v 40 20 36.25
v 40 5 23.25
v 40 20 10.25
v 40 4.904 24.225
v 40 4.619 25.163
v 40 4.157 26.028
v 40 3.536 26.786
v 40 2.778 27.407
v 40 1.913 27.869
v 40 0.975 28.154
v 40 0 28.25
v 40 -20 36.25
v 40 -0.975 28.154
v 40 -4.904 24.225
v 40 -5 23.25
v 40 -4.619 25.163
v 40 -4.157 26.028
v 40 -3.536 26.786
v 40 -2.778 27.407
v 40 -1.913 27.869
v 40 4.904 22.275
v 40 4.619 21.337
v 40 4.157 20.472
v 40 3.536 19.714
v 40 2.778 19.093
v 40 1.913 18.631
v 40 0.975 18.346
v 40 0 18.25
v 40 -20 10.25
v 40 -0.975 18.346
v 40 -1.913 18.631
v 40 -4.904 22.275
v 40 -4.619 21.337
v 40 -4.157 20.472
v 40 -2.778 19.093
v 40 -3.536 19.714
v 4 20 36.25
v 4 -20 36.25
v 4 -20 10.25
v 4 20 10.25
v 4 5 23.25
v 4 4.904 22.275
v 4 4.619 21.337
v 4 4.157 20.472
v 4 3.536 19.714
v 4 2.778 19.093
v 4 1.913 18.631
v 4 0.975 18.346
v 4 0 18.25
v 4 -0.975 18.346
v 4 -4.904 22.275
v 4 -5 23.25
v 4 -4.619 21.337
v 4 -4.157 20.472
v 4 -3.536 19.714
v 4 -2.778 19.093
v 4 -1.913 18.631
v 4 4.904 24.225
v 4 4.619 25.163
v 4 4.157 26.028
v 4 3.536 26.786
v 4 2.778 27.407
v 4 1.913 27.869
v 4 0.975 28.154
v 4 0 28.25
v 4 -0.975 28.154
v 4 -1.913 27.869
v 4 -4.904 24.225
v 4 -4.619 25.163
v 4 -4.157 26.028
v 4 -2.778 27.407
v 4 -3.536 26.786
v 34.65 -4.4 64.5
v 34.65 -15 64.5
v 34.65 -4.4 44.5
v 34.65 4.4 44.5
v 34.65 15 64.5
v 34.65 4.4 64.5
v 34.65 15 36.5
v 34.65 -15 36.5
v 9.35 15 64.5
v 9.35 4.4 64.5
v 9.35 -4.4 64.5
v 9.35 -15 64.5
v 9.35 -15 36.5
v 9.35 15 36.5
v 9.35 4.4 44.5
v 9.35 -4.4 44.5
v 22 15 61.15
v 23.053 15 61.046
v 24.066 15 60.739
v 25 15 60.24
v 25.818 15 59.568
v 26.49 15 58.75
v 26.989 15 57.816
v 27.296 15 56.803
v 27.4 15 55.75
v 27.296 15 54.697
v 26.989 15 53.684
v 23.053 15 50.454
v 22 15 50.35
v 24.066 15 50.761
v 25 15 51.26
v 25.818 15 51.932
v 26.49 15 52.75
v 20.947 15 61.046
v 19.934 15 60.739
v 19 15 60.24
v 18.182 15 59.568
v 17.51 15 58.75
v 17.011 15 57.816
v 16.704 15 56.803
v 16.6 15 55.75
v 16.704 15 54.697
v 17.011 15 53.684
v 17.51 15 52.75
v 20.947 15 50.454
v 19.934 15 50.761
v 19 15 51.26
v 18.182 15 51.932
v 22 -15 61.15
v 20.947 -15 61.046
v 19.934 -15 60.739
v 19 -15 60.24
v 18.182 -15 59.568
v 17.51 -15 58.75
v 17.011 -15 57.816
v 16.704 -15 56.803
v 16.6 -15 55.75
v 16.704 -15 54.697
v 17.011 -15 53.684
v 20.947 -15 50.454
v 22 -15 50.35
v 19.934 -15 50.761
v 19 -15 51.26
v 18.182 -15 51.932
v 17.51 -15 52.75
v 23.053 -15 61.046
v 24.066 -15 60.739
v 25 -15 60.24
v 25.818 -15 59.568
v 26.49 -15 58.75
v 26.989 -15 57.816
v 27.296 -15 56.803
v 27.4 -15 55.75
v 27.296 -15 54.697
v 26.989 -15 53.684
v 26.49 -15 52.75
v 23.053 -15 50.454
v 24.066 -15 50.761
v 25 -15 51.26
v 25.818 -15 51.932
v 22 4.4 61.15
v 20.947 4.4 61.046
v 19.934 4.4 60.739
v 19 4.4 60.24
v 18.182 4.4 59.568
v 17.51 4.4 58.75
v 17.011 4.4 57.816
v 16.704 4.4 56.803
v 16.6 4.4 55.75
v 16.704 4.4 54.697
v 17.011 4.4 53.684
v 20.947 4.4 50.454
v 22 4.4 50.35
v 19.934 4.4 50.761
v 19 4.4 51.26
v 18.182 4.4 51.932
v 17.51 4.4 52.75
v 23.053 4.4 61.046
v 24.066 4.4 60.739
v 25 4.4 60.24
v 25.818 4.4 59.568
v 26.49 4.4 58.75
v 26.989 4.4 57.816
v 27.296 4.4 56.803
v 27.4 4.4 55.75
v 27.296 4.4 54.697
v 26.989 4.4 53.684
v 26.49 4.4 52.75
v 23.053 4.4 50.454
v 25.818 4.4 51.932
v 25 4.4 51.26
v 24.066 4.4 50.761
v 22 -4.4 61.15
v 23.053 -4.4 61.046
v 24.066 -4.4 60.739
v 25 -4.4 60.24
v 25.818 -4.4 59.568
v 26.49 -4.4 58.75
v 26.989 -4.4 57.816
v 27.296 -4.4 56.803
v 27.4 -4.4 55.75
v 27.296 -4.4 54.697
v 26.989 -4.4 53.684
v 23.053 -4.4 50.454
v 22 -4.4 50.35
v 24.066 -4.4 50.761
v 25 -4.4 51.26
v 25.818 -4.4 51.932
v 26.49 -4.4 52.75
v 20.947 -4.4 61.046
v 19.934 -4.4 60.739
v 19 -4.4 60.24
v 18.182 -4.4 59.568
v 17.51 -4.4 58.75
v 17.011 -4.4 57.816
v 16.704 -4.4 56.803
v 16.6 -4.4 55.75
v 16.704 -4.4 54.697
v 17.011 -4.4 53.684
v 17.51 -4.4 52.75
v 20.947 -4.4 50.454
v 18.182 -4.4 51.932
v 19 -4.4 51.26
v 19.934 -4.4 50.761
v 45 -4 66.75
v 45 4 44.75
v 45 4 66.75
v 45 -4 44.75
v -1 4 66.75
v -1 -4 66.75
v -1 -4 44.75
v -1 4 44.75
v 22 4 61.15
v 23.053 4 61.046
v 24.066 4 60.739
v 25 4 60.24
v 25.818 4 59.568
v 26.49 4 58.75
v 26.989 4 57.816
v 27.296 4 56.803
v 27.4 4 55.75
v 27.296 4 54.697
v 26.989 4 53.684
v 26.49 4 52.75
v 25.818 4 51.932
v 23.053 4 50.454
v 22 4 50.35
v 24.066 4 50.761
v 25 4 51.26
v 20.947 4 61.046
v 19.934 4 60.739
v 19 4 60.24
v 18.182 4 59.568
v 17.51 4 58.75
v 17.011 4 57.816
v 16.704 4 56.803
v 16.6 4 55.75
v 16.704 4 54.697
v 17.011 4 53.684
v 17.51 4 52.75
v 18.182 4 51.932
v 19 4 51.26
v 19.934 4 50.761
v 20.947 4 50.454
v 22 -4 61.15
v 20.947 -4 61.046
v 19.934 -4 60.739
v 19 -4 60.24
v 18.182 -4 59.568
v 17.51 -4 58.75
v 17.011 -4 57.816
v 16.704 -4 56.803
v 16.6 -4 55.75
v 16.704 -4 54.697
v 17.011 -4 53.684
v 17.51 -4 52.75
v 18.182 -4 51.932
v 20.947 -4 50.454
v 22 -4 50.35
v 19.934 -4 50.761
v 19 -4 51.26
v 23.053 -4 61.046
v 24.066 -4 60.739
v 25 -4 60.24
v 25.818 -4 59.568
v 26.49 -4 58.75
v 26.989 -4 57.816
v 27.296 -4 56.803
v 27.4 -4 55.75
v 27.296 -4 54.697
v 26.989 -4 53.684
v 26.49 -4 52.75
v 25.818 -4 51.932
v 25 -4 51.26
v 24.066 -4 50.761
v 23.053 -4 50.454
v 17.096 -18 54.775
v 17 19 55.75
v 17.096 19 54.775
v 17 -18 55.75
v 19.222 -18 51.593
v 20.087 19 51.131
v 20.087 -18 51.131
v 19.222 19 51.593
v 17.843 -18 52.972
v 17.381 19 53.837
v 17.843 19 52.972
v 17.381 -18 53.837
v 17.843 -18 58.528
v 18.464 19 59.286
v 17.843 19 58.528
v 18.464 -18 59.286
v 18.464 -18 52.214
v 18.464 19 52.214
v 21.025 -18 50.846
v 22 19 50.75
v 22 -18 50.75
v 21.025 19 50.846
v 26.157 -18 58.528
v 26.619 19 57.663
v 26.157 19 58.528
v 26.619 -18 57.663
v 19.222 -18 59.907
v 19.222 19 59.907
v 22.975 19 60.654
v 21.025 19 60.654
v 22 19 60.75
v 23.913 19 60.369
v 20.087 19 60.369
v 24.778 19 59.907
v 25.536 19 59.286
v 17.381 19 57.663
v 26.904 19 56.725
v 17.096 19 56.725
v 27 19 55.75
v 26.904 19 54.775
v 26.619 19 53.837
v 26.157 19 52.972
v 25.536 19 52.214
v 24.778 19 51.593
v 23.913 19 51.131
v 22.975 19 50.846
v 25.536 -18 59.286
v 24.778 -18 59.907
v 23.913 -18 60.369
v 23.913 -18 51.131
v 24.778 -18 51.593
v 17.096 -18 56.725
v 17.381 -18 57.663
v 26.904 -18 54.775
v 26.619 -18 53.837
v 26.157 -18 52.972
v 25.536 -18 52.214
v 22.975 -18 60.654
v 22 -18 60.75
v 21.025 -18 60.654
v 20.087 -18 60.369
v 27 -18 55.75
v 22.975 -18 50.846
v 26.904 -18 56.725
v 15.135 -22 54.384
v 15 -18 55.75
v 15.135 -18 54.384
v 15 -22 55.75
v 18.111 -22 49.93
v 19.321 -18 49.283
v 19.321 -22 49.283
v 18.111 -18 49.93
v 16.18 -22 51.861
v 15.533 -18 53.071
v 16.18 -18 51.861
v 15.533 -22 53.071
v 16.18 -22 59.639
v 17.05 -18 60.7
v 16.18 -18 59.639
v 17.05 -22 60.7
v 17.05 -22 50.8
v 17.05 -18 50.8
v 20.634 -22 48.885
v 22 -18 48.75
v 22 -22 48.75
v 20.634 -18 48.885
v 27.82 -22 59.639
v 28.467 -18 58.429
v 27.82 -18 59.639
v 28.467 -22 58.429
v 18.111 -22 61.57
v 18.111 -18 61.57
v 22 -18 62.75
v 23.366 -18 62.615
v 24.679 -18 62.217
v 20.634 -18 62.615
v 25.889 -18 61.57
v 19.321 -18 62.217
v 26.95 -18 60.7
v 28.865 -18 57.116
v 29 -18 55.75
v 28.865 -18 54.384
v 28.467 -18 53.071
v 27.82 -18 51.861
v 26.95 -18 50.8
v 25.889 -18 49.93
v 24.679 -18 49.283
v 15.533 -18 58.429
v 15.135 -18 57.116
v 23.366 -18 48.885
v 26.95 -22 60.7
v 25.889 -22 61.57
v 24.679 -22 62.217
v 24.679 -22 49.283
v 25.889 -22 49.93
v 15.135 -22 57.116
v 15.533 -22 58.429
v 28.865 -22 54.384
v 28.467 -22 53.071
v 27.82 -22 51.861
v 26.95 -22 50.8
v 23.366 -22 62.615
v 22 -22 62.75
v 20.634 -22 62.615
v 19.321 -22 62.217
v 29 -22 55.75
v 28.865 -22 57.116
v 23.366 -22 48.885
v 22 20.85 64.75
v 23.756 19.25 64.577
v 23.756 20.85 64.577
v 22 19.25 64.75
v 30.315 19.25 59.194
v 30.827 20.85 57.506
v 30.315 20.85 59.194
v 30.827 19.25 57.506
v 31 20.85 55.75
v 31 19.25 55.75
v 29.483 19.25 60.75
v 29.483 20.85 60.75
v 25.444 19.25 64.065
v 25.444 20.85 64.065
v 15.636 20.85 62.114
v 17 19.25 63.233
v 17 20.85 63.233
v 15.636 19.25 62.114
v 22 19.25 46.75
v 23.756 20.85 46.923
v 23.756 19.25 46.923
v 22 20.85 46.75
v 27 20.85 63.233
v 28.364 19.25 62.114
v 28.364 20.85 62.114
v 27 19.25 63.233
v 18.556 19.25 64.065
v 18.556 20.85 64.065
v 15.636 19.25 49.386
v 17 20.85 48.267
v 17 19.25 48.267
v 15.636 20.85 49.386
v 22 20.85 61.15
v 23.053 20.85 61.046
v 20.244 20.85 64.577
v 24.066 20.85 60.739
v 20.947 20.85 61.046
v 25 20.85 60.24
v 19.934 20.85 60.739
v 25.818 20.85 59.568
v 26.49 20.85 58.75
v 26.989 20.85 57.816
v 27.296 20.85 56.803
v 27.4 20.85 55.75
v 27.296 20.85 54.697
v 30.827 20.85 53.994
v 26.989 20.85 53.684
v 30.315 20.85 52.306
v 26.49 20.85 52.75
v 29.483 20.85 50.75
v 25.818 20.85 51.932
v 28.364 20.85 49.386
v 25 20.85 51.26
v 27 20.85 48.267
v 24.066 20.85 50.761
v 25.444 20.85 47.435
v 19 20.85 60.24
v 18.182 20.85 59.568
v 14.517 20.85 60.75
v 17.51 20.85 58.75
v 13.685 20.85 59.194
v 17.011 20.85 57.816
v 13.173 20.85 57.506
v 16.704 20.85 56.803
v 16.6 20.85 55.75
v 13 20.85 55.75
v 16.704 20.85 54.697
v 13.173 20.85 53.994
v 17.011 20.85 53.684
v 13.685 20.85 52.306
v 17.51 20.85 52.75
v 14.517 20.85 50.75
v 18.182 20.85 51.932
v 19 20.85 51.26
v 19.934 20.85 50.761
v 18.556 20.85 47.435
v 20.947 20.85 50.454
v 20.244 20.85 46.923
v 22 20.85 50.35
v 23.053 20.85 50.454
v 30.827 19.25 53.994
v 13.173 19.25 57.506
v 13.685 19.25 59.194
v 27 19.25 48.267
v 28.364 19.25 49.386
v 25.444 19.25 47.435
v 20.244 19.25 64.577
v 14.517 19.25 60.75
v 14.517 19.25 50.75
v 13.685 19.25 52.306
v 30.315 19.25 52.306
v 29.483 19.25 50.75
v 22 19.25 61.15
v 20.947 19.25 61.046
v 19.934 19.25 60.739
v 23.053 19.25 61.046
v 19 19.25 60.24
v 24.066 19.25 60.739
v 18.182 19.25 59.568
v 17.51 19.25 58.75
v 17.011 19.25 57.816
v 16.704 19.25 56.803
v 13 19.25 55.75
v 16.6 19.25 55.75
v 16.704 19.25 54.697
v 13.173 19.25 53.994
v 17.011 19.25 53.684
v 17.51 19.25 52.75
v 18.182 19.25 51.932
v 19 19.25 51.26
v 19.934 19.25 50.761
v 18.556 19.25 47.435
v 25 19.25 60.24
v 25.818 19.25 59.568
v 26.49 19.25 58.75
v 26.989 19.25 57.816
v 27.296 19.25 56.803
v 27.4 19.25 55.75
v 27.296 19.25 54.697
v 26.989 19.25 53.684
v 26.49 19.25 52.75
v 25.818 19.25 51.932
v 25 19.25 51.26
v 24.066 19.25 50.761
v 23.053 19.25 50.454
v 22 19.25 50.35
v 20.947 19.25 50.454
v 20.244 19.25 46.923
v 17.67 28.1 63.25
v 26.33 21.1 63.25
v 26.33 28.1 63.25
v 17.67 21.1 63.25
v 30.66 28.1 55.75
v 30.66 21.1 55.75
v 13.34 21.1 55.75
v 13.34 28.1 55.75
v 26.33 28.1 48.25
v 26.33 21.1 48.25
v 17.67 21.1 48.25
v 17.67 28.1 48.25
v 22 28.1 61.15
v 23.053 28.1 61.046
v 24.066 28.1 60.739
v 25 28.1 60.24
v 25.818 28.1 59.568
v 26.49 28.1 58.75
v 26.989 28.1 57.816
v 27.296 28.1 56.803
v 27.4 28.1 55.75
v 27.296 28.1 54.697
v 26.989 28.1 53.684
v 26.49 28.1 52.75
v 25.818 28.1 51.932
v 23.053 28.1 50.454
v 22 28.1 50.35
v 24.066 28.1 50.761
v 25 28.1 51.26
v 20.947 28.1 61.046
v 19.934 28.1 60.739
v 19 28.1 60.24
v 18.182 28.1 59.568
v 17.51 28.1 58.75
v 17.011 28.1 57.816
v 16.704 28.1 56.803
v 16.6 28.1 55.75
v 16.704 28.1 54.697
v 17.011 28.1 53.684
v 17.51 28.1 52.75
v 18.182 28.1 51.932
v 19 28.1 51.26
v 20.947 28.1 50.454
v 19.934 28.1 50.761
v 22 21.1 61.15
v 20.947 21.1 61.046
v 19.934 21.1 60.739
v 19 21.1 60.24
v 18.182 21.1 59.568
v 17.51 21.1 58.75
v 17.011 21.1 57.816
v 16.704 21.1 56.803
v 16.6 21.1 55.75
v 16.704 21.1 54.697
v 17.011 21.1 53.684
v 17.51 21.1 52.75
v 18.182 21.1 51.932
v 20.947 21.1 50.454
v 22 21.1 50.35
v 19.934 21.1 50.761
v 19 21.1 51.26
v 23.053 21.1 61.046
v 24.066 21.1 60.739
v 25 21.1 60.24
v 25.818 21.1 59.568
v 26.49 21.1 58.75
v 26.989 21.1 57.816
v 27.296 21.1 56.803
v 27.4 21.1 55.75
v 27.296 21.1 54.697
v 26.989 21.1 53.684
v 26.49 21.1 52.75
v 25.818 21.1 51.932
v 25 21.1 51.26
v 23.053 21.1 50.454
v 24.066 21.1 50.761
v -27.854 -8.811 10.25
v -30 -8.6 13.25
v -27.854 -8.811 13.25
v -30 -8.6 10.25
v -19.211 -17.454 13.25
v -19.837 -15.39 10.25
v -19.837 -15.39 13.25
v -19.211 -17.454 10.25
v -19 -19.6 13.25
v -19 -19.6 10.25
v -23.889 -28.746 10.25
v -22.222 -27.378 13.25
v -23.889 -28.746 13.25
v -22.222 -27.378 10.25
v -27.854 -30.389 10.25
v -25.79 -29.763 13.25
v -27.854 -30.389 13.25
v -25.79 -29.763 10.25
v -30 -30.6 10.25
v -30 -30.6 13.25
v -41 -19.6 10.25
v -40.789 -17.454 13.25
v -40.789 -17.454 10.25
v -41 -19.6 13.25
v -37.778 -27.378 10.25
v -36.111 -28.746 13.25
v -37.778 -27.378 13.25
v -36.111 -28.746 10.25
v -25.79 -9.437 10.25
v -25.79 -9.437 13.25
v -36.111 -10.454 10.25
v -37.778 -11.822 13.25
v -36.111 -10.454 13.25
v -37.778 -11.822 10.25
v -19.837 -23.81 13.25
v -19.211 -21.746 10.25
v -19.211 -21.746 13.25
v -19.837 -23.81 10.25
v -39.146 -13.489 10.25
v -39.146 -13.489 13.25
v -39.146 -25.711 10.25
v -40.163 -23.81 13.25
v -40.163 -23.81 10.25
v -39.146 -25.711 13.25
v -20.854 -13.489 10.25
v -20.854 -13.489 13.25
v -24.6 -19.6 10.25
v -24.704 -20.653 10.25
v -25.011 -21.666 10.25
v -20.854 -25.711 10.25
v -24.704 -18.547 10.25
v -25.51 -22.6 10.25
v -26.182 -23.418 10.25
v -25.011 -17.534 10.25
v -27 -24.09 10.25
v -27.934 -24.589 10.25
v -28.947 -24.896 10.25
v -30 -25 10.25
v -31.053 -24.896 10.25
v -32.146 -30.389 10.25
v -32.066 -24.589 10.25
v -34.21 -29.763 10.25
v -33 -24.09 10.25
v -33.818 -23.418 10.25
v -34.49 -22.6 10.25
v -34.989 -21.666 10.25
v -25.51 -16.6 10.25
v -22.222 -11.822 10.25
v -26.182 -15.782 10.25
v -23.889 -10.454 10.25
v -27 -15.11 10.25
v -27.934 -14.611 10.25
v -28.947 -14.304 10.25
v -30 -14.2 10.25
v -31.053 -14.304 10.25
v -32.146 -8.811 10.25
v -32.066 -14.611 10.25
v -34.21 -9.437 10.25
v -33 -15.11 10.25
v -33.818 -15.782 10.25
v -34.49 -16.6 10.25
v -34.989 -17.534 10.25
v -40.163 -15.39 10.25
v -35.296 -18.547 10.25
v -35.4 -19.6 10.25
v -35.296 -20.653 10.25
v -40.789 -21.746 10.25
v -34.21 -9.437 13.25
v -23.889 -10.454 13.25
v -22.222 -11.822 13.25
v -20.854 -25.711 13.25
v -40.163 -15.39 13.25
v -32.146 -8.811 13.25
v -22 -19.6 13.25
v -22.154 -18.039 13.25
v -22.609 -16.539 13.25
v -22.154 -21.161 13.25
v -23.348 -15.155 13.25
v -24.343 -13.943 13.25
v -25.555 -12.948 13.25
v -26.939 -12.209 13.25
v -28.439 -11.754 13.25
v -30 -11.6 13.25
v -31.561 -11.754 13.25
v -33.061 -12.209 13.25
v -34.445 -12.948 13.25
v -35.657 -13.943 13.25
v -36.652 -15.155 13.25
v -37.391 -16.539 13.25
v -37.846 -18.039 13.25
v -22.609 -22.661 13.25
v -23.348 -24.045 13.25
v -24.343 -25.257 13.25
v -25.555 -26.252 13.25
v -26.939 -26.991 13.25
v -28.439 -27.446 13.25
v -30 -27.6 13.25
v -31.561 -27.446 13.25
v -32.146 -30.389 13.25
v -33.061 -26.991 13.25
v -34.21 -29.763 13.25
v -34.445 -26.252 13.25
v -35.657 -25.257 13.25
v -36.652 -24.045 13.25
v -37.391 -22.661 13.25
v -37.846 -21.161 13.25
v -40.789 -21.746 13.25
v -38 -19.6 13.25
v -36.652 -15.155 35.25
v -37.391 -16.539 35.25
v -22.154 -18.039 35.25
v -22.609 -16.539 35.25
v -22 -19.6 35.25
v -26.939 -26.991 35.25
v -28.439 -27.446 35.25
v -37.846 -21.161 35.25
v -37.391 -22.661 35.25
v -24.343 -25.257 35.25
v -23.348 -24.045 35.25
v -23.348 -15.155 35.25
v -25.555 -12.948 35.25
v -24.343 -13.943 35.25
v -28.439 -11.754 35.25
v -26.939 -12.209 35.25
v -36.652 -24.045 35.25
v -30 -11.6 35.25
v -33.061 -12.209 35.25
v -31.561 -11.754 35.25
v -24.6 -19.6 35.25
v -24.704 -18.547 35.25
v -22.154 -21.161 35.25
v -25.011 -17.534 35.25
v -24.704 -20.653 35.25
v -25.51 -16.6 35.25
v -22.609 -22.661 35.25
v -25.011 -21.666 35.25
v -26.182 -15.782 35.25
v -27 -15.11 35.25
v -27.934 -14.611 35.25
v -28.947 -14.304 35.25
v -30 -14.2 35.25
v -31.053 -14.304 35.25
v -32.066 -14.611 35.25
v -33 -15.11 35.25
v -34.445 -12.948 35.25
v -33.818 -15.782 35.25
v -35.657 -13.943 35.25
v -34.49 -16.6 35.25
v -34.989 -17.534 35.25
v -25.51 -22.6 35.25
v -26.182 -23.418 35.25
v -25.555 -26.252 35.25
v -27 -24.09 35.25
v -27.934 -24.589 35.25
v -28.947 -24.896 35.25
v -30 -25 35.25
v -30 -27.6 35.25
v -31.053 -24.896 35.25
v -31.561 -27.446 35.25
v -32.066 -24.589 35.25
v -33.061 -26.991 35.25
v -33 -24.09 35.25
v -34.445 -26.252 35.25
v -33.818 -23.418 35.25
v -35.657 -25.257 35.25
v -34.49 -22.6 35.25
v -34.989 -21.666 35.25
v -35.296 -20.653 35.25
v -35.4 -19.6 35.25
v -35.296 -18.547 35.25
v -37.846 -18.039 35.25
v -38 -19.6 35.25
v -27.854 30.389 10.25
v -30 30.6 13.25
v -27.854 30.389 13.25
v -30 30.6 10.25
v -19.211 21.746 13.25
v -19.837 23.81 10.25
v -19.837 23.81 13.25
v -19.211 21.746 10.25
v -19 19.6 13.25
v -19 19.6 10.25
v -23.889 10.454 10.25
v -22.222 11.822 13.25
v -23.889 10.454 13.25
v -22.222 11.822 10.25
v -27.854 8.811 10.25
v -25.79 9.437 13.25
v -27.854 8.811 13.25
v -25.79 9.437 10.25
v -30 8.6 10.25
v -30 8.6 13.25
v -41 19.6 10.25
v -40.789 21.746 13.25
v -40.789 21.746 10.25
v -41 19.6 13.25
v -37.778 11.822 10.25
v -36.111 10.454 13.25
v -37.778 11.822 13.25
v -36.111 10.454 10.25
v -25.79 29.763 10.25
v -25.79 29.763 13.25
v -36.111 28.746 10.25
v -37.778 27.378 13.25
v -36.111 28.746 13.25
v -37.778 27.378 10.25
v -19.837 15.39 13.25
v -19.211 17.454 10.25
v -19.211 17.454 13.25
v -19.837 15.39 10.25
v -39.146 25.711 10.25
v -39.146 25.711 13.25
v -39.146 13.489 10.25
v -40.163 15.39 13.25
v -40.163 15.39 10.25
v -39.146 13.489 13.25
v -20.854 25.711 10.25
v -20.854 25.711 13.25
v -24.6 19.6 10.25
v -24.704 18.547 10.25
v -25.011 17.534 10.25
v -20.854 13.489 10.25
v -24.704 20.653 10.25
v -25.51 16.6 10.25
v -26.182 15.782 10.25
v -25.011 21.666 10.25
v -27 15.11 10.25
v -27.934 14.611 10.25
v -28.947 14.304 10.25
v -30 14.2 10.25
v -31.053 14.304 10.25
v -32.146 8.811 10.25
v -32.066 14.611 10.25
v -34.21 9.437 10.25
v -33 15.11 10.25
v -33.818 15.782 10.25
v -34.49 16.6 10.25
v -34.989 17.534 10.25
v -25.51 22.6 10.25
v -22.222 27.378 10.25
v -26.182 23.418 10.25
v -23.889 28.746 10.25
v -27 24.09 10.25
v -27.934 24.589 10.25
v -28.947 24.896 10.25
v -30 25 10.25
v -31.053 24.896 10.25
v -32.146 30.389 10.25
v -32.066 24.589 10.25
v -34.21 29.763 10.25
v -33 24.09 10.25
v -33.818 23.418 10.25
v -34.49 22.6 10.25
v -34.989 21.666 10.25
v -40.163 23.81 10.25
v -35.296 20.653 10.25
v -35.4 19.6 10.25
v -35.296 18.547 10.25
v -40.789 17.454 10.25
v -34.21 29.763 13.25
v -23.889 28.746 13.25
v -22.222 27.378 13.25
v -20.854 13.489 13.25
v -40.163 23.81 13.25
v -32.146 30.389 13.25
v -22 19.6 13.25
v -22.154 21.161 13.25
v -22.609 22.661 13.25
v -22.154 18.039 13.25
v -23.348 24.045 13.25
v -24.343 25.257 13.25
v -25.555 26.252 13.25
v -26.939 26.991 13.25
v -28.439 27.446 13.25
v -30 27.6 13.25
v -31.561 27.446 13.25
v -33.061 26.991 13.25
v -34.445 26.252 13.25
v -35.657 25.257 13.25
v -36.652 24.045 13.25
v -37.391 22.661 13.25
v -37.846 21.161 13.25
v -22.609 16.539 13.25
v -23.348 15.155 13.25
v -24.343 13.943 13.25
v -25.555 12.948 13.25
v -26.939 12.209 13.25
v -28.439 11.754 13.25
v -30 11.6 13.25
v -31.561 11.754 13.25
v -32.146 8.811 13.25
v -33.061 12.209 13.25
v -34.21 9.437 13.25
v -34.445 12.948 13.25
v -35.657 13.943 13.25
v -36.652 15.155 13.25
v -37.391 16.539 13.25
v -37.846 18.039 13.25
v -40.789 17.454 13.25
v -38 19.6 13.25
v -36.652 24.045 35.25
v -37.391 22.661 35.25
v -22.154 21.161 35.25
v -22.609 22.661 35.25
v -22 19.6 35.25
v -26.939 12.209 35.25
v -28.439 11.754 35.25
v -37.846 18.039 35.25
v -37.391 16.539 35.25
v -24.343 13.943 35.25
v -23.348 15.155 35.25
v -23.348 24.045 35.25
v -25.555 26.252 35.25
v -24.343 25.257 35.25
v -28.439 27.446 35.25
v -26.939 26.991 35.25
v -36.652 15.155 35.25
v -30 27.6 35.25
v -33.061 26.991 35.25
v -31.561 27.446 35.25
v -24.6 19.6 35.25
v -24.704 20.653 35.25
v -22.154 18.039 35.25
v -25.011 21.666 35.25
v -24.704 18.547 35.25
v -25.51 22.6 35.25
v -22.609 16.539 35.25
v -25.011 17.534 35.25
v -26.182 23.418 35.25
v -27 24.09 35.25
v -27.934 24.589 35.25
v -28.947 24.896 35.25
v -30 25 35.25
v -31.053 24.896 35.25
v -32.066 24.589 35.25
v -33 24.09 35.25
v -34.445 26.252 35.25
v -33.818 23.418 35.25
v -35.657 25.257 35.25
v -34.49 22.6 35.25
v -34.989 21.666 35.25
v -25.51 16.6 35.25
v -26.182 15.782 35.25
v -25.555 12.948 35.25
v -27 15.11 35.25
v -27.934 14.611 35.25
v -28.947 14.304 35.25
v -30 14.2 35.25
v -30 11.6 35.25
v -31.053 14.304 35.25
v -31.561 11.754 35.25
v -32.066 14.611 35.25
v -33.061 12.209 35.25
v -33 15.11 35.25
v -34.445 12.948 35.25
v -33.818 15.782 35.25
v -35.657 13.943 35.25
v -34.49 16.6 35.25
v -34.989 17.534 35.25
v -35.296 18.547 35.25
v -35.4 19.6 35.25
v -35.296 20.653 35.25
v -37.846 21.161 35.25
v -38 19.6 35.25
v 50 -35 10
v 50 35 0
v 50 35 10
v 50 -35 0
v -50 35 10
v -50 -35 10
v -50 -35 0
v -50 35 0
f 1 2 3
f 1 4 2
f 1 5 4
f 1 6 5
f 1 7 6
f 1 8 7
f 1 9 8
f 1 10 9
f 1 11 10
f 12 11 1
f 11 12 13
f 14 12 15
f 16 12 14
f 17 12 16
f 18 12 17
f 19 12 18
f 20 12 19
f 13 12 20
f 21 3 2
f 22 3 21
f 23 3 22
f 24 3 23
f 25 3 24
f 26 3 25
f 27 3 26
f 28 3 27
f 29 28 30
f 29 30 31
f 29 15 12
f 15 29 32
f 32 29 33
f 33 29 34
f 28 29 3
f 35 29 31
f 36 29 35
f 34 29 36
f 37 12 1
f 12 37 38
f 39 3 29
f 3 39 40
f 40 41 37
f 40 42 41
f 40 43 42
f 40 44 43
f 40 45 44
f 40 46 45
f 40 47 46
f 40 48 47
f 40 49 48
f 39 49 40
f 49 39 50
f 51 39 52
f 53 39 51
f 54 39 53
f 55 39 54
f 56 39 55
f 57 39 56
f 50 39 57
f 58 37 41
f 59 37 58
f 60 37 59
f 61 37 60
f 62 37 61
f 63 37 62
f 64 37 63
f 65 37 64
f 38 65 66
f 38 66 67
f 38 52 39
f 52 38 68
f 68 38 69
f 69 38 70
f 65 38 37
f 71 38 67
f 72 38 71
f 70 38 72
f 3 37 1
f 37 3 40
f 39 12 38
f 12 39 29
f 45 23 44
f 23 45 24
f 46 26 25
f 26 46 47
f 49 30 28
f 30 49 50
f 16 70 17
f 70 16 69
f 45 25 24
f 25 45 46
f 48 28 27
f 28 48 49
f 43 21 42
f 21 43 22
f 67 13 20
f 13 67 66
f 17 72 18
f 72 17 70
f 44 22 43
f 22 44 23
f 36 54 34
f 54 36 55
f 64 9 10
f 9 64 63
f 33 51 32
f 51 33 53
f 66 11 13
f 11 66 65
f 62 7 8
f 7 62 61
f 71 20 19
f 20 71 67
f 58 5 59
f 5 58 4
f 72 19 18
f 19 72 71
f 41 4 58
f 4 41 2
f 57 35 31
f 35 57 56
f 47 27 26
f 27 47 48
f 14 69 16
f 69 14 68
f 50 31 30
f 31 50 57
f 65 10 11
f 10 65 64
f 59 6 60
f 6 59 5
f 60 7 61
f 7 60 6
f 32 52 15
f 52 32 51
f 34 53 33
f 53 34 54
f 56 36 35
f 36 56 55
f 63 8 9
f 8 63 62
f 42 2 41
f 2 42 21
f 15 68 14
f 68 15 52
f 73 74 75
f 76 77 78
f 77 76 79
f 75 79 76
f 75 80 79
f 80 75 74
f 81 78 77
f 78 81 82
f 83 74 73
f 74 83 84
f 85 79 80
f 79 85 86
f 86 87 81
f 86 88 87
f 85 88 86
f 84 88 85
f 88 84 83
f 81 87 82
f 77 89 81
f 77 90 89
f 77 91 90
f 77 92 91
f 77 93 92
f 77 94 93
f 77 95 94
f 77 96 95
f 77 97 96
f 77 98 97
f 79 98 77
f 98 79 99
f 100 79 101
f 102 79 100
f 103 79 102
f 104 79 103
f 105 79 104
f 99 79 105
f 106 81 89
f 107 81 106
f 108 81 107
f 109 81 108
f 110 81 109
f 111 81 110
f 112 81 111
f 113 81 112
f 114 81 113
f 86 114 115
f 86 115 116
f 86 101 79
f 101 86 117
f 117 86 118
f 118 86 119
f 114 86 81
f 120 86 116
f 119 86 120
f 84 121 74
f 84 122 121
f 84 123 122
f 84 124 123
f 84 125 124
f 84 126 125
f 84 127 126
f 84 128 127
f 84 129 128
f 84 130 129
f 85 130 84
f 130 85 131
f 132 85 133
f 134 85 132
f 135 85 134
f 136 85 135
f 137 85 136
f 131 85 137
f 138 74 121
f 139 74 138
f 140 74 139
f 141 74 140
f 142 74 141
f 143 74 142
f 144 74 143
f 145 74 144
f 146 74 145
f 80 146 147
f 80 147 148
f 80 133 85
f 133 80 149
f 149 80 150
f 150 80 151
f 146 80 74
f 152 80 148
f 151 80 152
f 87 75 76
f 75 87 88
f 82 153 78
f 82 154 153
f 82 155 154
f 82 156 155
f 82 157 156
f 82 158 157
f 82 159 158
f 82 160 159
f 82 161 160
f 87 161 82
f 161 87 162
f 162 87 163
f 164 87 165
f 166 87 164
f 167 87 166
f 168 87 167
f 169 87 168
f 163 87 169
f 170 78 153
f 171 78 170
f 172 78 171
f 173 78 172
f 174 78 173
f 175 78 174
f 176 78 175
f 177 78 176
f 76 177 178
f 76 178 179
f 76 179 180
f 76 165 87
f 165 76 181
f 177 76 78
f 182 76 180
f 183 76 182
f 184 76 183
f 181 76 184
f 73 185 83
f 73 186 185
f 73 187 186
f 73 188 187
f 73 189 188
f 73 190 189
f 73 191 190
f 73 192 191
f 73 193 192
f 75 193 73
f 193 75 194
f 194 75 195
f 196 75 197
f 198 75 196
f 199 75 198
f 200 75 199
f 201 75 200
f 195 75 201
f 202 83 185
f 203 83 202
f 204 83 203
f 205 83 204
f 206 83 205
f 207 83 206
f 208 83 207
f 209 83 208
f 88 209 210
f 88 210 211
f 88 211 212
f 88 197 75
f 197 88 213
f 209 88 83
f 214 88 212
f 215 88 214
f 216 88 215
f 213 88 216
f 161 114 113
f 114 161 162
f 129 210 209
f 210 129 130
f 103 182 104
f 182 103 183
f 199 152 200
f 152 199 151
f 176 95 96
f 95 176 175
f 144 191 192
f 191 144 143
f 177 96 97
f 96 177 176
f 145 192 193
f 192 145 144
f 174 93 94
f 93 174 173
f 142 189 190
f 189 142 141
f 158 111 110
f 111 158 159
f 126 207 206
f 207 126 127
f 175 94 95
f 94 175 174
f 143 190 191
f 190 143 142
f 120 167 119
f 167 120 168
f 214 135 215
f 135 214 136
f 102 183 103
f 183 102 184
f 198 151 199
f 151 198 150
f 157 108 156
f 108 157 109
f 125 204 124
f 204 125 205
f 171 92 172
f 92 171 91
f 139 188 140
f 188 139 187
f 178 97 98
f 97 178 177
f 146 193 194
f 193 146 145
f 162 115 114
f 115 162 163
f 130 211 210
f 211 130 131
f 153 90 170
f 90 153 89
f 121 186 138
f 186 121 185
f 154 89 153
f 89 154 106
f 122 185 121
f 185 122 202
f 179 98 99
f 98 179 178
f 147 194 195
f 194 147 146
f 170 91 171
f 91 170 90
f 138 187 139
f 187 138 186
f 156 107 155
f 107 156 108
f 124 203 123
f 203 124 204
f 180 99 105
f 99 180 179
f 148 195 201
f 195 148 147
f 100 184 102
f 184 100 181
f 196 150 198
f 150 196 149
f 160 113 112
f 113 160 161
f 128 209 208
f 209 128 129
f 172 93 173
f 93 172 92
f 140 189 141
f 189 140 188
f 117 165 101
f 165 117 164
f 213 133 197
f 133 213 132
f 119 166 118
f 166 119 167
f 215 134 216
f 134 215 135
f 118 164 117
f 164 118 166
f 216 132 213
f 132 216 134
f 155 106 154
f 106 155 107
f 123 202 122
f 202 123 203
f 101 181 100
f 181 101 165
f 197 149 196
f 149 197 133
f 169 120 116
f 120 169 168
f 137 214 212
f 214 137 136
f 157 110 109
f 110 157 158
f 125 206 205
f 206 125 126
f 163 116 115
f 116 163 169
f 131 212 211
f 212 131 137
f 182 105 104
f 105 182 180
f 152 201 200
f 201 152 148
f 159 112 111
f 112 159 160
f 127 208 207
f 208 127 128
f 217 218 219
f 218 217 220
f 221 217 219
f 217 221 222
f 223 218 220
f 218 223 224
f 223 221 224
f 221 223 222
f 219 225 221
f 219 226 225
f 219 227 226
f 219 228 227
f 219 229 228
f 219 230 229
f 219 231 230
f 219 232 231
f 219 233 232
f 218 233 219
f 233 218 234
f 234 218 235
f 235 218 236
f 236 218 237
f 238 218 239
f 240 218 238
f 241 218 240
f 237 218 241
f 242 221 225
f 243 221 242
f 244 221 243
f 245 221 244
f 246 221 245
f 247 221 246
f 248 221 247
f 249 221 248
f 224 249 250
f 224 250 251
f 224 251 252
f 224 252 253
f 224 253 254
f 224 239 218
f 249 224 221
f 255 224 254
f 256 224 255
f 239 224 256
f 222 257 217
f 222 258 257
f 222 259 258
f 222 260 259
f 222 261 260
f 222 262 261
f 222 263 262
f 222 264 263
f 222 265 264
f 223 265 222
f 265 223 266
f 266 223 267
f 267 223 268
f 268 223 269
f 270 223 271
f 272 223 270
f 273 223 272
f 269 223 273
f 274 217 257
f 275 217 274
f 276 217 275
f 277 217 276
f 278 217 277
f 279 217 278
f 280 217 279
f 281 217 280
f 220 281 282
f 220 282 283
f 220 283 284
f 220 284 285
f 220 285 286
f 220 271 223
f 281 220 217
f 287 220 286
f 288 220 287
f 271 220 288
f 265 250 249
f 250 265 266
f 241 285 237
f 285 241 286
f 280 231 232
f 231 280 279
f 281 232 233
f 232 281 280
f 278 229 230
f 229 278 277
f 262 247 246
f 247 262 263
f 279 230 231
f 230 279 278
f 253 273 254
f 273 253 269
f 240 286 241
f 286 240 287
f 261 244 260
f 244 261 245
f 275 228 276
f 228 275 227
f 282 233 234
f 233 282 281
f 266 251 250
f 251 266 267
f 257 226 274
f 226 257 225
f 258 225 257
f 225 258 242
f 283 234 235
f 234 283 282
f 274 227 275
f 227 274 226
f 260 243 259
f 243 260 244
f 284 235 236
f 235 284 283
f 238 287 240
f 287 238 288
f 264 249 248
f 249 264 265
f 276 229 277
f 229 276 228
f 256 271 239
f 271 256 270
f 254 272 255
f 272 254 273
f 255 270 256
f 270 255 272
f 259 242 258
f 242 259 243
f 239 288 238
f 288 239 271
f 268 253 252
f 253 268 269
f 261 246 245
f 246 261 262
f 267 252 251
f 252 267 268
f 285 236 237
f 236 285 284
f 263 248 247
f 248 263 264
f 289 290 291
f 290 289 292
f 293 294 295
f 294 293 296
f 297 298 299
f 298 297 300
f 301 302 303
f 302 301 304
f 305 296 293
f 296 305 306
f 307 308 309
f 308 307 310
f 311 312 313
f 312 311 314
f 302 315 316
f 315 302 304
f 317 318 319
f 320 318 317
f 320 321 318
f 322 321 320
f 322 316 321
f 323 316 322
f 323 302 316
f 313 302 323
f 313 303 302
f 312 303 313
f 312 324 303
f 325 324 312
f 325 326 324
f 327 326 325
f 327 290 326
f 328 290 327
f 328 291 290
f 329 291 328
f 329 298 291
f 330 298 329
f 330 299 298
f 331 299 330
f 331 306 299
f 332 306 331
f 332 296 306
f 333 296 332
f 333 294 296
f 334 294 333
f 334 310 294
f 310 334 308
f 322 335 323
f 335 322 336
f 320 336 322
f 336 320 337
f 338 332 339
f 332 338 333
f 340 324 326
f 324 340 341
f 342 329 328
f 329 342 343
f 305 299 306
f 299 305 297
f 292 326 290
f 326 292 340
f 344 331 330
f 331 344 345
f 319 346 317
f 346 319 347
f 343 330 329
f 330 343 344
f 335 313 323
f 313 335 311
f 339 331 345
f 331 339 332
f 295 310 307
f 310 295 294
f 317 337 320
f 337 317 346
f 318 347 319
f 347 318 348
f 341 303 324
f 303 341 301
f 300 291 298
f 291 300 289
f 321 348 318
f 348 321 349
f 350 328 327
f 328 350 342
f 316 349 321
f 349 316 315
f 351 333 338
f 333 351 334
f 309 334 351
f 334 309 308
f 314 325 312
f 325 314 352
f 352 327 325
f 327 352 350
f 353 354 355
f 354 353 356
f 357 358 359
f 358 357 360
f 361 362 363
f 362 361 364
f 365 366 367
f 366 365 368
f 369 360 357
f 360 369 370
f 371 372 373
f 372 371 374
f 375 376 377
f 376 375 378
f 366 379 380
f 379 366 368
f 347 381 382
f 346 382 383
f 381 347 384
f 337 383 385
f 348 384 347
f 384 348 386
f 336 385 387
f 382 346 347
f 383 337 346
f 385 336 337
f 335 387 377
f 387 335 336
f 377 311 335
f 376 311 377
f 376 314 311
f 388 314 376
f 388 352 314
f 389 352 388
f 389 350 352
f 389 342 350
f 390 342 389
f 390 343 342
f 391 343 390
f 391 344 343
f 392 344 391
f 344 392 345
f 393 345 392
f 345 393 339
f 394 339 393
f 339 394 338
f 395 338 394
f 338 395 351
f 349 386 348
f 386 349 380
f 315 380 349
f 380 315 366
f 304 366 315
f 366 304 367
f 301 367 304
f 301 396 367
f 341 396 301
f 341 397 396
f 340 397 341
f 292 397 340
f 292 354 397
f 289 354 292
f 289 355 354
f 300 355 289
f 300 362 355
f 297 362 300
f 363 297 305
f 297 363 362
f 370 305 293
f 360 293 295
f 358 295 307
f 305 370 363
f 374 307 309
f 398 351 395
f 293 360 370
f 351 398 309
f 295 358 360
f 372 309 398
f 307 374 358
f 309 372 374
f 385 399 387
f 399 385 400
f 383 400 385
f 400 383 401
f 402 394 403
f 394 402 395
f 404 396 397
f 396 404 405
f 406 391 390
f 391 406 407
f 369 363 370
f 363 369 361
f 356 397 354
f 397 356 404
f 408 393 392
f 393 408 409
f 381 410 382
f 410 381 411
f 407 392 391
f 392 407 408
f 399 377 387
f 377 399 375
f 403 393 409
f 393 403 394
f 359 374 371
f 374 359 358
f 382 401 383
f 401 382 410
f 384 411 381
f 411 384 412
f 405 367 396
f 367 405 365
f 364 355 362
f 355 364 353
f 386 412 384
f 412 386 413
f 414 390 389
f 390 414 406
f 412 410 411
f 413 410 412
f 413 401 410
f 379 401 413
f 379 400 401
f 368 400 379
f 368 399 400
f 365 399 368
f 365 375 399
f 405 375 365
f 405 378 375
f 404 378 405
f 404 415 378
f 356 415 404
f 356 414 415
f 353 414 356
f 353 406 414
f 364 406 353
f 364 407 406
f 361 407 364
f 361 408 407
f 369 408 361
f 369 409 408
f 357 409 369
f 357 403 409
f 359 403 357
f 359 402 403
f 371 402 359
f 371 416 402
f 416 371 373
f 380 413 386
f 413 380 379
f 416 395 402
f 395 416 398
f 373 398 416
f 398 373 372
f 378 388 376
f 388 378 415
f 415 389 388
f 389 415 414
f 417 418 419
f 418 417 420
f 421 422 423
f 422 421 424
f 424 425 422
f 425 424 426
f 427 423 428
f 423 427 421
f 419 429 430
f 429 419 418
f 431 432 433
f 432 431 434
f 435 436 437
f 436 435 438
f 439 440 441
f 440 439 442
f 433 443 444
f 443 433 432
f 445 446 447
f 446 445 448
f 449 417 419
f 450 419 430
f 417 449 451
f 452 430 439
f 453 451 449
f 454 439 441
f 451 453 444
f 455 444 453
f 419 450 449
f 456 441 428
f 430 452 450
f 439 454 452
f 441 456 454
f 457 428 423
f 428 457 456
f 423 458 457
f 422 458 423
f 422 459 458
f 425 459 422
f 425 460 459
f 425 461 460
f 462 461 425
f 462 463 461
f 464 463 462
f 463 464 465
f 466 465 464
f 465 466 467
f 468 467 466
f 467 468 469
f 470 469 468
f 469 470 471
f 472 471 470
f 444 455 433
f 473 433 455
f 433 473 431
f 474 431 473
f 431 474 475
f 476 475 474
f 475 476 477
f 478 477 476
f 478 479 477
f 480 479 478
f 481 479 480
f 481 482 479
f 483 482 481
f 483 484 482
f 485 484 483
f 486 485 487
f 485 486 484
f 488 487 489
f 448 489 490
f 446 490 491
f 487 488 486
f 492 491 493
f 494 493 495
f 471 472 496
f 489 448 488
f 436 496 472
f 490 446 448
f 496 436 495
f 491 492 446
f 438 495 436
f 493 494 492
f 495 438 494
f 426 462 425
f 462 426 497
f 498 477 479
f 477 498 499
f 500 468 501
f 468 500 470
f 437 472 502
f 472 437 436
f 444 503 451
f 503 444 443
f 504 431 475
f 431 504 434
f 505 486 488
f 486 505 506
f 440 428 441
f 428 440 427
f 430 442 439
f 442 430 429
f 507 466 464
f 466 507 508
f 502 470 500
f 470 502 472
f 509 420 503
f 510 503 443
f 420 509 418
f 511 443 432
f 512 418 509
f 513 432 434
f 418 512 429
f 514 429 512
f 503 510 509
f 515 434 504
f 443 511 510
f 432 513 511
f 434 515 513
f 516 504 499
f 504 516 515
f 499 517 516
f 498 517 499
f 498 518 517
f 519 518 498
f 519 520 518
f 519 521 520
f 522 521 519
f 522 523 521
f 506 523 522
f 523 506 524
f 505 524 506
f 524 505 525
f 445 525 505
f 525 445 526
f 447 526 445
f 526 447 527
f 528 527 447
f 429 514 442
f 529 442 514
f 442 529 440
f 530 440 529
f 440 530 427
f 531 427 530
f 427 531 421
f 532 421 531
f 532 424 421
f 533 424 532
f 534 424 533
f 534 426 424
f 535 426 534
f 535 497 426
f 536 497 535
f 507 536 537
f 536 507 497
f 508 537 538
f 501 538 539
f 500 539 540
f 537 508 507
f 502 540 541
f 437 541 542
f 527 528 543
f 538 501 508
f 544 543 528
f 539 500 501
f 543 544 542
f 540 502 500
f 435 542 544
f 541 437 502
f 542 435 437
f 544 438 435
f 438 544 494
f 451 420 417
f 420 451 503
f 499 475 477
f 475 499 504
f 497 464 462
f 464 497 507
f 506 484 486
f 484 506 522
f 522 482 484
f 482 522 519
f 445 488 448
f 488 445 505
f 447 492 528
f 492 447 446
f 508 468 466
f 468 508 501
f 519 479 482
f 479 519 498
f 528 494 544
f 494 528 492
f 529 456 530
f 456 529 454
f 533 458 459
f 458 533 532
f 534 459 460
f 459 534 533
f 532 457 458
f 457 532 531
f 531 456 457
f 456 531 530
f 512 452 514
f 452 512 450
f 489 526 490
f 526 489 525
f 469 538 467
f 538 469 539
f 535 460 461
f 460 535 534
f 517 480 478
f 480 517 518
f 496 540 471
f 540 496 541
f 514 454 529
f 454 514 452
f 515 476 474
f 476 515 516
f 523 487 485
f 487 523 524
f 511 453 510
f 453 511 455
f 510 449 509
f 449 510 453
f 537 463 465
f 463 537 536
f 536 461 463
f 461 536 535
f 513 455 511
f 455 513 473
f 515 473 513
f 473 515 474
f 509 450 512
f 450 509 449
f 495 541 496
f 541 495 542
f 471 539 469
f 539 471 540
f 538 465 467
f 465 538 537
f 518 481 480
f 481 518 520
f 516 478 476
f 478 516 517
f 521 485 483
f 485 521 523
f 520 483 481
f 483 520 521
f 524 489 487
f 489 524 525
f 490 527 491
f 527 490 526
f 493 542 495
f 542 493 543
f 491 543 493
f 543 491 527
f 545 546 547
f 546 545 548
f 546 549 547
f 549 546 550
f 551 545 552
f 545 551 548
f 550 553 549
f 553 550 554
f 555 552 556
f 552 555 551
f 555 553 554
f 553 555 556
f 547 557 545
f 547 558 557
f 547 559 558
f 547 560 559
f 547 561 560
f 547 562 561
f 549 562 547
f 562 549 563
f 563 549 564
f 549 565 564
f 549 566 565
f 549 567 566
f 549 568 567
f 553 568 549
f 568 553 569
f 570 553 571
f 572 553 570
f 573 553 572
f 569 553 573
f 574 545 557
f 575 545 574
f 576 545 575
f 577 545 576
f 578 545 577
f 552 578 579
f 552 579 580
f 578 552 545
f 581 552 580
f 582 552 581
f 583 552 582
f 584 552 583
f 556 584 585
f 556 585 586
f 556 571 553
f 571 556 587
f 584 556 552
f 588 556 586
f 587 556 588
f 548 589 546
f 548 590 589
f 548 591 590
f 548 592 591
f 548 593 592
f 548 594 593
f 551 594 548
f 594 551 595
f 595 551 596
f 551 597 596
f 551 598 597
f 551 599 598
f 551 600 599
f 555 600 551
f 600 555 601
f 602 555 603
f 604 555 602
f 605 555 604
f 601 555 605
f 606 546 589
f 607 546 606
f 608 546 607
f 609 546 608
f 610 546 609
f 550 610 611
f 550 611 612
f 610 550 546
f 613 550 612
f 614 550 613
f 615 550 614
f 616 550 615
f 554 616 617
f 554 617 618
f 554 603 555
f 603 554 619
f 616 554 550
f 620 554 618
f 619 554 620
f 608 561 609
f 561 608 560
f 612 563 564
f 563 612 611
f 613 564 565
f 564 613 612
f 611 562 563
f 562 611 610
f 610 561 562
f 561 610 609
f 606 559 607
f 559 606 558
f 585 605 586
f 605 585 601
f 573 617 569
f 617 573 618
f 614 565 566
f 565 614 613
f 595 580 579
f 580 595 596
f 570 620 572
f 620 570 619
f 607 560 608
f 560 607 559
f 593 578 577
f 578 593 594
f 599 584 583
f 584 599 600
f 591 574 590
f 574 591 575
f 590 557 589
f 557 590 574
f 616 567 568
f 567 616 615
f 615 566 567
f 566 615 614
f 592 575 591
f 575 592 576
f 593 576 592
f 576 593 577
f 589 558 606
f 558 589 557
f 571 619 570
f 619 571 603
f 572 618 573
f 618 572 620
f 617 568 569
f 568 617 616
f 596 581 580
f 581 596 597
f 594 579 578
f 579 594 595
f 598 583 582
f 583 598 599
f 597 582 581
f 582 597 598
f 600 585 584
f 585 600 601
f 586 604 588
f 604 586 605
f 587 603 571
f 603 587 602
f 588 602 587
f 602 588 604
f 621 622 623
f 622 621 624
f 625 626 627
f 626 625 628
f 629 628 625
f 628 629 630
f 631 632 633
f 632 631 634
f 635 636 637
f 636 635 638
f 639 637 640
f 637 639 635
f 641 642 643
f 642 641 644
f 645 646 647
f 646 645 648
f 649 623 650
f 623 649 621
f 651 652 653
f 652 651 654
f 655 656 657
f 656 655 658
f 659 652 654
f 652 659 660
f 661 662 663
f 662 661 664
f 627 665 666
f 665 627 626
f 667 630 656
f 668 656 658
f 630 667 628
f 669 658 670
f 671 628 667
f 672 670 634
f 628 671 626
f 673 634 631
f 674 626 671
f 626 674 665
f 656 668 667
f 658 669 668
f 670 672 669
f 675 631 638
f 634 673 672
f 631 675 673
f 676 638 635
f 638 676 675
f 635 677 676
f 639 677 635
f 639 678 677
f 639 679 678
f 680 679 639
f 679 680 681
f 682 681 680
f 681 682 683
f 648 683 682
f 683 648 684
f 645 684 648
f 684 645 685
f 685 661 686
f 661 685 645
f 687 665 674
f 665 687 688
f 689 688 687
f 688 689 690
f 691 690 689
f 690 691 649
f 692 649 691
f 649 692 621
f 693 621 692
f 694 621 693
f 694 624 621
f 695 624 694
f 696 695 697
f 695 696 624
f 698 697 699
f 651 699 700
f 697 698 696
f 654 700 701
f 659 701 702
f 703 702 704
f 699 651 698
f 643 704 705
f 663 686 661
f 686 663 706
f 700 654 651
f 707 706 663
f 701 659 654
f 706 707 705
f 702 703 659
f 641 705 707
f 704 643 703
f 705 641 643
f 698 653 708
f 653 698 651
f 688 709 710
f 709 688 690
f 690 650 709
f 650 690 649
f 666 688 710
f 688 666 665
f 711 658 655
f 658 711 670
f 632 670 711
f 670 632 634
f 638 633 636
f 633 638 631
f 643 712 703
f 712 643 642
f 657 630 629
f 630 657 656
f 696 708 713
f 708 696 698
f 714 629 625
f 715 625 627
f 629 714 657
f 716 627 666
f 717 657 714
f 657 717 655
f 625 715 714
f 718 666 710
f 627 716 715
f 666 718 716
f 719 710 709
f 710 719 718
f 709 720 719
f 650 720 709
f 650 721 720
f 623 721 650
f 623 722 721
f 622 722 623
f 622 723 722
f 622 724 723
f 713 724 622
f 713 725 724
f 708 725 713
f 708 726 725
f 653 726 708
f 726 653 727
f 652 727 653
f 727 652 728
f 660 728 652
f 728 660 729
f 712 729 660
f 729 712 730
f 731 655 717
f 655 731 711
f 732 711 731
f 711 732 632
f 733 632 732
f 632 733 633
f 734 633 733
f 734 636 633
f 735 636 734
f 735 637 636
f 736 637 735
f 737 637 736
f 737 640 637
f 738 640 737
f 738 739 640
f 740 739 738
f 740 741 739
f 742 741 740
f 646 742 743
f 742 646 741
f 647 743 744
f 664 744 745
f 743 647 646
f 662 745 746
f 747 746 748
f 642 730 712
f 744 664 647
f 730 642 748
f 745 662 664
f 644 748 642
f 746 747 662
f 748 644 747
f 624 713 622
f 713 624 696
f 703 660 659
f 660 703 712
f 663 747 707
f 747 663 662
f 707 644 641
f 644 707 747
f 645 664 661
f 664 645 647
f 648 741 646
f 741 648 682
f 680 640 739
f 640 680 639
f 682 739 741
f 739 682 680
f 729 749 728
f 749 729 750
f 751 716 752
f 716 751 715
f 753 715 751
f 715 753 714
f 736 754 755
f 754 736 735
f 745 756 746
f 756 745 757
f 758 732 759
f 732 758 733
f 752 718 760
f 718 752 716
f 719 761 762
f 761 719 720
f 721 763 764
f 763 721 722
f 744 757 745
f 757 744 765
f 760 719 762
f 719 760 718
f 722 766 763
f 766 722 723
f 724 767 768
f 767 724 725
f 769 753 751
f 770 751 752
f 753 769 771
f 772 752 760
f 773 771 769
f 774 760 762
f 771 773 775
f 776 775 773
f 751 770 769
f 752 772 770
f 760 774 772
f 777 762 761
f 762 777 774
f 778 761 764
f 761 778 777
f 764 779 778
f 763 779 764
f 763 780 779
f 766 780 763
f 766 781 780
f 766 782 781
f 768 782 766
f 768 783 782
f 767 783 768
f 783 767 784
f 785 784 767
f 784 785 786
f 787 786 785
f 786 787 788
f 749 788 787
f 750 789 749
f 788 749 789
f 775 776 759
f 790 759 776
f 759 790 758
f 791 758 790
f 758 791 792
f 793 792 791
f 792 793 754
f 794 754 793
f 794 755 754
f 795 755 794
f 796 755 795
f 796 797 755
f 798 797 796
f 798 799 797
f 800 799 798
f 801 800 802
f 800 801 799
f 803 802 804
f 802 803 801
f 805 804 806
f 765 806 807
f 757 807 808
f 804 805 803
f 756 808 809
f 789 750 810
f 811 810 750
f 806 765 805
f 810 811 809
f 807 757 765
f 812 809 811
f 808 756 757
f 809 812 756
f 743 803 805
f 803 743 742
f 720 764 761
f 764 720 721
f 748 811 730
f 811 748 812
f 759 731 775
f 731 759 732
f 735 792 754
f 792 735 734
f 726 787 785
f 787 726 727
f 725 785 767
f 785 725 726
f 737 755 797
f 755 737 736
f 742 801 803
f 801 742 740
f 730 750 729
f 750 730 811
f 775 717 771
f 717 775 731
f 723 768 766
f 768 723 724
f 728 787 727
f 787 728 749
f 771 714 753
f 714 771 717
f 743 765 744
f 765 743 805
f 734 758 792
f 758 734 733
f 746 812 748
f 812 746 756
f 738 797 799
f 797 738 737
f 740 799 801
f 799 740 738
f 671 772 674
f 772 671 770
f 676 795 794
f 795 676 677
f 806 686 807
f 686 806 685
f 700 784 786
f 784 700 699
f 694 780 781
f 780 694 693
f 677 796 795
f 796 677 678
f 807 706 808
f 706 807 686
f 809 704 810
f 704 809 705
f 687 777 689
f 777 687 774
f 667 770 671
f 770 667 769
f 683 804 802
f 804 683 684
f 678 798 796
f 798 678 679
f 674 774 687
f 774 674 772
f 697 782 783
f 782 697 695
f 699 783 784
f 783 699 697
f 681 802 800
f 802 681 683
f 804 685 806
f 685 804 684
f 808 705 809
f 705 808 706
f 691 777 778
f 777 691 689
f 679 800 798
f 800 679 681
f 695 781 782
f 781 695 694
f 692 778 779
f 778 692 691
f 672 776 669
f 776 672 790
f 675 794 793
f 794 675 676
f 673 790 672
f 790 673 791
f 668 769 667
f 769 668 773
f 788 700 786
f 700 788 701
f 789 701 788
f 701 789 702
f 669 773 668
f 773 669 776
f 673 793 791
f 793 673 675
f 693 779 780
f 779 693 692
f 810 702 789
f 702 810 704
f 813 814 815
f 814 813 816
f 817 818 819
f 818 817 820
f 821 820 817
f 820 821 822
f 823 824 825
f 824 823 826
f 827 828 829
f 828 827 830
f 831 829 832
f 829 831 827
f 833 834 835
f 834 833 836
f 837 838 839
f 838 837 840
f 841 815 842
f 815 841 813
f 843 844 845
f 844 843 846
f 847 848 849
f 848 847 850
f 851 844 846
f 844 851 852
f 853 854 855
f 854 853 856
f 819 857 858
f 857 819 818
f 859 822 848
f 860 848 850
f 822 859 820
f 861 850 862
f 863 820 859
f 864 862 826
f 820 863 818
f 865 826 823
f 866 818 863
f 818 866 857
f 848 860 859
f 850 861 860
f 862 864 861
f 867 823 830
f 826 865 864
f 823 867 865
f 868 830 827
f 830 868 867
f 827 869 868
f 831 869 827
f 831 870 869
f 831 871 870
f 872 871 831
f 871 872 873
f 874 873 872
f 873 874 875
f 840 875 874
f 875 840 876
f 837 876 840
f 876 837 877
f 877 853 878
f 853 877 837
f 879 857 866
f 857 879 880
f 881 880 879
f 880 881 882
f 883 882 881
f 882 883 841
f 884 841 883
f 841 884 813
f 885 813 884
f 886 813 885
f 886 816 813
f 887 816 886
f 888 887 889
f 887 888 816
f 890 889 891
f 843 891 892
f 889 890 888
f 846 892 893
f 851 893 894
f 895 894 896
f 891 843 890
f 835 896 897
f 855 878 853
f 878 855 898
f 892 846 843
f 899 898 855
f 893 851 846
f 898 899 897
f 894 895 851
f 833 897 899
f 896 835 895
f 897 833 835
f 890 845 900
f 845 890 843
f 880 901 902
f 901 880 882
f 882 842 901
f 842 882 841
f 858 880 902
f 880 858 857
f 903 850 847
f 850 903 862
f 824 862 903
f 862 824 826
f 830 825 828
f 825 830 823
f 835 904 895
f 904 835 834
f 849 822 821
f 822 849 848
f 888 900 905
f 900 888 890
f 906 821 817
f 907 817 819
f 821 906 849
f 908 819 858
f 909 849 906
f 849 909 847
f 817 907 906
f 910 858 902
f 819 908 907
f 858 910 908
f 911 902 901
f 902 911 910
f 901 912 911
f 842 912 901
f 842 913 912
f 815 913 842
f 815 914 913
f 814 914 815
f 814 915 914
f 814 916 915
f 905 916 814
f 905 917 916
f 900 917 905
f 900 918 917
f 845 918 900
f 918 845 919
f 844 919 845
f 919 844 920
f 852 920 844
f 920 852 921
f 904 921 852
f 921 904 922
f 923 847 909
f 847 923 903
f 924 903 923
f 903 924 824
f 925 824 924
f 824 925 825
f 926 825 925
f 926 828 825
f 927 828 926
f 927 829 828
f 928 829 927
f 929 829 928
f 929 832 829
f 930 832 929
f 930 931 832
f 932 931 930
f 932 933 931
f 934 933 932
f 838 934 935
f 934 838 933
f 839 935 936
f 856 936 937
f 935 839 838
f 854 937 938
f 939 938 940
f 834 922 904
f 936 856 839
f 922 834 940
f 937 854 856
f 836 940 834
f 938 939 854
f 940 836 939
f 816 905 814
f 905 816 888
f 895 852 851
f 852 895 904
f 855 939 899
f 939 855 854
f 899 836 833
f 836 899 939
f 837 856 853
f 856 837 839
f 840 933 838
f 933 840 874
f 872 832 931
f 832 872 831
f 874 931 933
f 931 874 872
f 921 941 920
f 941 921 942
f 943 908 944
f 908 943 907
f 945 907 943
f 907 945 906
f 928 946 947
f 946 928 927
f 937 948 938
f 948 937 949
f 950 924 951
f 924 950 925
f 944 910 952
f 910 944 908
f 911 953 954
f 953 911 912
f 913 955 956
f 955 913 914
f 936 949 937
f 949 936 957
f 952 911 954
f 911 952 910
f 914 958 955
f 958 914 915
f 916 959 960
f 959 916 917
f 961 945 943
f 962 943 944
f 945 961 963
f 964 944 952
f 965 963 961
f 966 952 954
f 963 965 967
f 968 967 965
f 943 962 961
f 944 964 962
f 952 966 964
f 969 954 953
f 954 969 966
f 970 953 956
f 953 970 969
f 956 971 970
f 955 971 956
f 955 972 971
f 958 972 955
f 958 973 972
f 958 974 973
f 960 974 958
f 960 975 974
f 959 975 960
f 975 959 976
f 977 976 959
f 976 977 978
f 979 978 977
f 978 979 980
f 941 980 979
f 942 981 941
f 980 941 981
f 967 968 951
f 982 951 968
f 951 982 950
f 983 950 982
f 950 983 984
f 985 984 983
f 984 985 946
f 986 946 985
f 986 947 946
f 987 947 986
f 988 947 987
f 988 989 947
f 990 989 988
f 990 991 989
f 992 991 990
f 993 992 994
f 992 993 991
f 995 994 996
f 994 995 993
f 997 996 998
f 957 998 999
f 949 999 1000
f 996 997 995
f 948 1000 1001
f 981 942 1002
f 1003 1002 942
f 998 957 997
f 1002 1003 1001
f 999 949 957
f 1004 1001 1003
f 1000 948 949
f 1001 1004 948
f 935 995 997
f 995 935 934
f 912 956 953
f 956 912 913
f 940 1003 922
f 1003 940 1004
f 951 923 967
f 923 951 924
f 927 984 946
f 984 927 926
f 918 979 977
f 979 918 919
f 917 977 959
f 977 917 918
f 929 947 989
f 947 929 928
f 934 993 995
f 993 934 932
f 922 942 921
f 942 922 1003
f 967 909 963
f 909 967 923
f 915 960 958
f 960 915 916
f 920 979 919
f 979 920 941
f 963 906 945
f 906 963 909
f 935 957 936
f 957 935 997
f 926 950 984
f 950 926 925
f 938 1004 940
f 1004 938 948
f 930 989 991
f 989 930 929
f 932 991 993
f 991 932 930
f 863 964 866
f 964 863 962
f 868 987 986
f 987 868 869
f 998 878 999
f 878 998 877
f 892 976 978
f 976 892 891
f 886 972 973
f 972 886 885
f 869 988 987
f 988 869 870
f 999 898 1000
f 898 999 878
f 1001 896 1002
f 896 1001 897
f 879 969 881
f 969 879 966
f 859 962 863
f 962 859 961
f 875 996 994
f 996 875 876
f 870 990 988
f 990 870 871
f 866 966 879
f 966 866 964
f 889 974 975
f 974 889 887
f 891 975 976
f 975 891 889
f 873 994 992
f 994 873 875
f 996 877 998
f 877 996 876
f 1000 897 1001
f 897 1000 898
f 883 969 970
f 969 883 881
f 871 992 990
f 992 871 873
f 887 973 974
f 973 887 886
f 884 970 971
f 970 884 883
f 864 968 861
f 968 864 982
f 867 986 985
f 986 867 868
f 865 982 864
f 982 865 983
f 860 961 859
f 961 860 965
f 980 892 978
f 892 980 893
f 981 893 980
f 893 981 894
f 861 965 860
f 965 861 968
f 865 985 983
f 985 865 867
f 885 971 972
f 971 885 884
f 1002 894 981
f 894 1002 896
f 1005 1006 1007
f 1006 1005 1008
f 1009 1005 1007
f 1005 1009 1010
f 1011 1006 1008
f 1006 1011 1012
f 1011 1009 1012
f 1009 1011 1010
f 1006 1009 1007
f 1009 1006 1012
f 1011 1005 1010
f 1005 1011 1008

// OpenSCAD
$fn = 32;

// ------------------------------------------------------------------------
// Indexing jig: plate 100 x 70 mm, pin d10
// Every part is its own module, assembly() places every instance.
// ------------------------------------------------------------------------

// --- part 1 ---
module jig_plate() {
  difference() {
    translate([-50, -35, 0]) cube([100, 70, 10]);
  }
}

// --- part 2 ---
module locator_block() {
  difference() {
    translate([-18, -20, 0]) cube([36, 40, 26]);
    translate([0, 0, 13]) rotate([0, 90, 0]) cylinder(h = 38, d = 10, center = true);
  }
}

// --- part 3 ---
module index_fork() {
  difference() {
    translate([-12.65, -15, 0]) cube([25.3, 30, 28]);
    translate([-13.65, -4.4, 8]) cube([27.3, 8.8, 21]);
    translate([0, 0, 19.25]) rotate([90, 0, 0]) cylinder(h = 32, d = 10.8, center = true);
  }
}

// --- part 4 ---
module index_arm() {
  difference() {
    translate([-23, -4, 0]) cube([46, 8, 22]);
    translate([0, 0, 11]) rotate([90, 0, 0]) cylinder(h = 10, d = 10.8, center = true);
  }
}

// --- part 5 ---
module index_pin() {
  rotate([0, 90, 0]) cylinder(h = 38, d = 10, center = true);
  translate([-22, 0, 0]) rotate([0, 90, 0]) cylinder(h = 4, d = 14);
}

// --- part 6 ---
module pin_washer() {
  difference() {
      translate([0, 0, 0]) cylinder(h = 1.6, d = 18);
      translate([0, 0, -1]) cylinder(h = 3.6, d = 10.8);
    }
}

// --- part 7 ---
module lock_nut() {
  difference() {
    linear_extrude(height = 7) polygon(points = [[8.66, 0], [4.33, 7.5], [-4.33, 7.5], [-8.66, 0], [-4.33, -7.5], [4.33, -7.5]]);
    translate([0, 0, -1]) cylinder(h = 9, d = 10.8);
  }
}

// --- part 8 ---
module guide_bush_a() {
  difference() {
    union() {
      cylinder(h = 3, d = 22);
      translate([0, 0, 3]) cylinder(h = 22, d = 16);
    }
    translate([0, 0, -1]) cylinder(h = 27, d = 10.8);
  }
}

// --- part 9 ---
module guide_bush_b() {
  difference() {
    union() {
      cylinder(h = 3, d = 22);
      translate([0, 0, 3]) cylinder(h = 22, d = 16);
    }
    translate([0, 0, -1]) cylinder(h = 27, d = 10.8);
  }
}

// --- assembly ---
module assembly() {
  color([0.80, 0.24, 0.20]) translate([0, 0, 0]) rotate([0, 0, 0]) jig_plate();
  color([0.20, 0.45, 0.75]) translate([22, 0, 10.25]) rotate([0, 0, 0]) locator_block();
  color([0.25, 0.62, 0.32]) translate([22, 0, 36.5]) rotate([0, 0, 0]) index_fork();
  color([0.92, 0.70, 0.18]) translate([22, 0, 44.75]) rotate([0, 0, 0]) index_arm();
  color([0.58, 0.35, 0.70]) translate([22, 0, 55.75]) rotate([0, 0, 90]) index_pin();
  color([0.16, 0.66, 0.66]) translate([22, 20.85, 55.75]) rotate([90, 0, 0]) pin_washer();
  color([0.85, 0.48, 0.18]) translate([22, 28.1, 55.75]) rotate([90, 0, 0]) lock_nut();
  color([0.55, 0.60, 0.65]) translate([-30, -19.6, 10.25]) rotate([0, 0, 0]) guide_bush_a();
  color([0.75, 0.30, 0.55]) translate([-30, 19.6, 10.25]) rotate([0, 0, 0]) guide_bush_b();
}

assembly();
